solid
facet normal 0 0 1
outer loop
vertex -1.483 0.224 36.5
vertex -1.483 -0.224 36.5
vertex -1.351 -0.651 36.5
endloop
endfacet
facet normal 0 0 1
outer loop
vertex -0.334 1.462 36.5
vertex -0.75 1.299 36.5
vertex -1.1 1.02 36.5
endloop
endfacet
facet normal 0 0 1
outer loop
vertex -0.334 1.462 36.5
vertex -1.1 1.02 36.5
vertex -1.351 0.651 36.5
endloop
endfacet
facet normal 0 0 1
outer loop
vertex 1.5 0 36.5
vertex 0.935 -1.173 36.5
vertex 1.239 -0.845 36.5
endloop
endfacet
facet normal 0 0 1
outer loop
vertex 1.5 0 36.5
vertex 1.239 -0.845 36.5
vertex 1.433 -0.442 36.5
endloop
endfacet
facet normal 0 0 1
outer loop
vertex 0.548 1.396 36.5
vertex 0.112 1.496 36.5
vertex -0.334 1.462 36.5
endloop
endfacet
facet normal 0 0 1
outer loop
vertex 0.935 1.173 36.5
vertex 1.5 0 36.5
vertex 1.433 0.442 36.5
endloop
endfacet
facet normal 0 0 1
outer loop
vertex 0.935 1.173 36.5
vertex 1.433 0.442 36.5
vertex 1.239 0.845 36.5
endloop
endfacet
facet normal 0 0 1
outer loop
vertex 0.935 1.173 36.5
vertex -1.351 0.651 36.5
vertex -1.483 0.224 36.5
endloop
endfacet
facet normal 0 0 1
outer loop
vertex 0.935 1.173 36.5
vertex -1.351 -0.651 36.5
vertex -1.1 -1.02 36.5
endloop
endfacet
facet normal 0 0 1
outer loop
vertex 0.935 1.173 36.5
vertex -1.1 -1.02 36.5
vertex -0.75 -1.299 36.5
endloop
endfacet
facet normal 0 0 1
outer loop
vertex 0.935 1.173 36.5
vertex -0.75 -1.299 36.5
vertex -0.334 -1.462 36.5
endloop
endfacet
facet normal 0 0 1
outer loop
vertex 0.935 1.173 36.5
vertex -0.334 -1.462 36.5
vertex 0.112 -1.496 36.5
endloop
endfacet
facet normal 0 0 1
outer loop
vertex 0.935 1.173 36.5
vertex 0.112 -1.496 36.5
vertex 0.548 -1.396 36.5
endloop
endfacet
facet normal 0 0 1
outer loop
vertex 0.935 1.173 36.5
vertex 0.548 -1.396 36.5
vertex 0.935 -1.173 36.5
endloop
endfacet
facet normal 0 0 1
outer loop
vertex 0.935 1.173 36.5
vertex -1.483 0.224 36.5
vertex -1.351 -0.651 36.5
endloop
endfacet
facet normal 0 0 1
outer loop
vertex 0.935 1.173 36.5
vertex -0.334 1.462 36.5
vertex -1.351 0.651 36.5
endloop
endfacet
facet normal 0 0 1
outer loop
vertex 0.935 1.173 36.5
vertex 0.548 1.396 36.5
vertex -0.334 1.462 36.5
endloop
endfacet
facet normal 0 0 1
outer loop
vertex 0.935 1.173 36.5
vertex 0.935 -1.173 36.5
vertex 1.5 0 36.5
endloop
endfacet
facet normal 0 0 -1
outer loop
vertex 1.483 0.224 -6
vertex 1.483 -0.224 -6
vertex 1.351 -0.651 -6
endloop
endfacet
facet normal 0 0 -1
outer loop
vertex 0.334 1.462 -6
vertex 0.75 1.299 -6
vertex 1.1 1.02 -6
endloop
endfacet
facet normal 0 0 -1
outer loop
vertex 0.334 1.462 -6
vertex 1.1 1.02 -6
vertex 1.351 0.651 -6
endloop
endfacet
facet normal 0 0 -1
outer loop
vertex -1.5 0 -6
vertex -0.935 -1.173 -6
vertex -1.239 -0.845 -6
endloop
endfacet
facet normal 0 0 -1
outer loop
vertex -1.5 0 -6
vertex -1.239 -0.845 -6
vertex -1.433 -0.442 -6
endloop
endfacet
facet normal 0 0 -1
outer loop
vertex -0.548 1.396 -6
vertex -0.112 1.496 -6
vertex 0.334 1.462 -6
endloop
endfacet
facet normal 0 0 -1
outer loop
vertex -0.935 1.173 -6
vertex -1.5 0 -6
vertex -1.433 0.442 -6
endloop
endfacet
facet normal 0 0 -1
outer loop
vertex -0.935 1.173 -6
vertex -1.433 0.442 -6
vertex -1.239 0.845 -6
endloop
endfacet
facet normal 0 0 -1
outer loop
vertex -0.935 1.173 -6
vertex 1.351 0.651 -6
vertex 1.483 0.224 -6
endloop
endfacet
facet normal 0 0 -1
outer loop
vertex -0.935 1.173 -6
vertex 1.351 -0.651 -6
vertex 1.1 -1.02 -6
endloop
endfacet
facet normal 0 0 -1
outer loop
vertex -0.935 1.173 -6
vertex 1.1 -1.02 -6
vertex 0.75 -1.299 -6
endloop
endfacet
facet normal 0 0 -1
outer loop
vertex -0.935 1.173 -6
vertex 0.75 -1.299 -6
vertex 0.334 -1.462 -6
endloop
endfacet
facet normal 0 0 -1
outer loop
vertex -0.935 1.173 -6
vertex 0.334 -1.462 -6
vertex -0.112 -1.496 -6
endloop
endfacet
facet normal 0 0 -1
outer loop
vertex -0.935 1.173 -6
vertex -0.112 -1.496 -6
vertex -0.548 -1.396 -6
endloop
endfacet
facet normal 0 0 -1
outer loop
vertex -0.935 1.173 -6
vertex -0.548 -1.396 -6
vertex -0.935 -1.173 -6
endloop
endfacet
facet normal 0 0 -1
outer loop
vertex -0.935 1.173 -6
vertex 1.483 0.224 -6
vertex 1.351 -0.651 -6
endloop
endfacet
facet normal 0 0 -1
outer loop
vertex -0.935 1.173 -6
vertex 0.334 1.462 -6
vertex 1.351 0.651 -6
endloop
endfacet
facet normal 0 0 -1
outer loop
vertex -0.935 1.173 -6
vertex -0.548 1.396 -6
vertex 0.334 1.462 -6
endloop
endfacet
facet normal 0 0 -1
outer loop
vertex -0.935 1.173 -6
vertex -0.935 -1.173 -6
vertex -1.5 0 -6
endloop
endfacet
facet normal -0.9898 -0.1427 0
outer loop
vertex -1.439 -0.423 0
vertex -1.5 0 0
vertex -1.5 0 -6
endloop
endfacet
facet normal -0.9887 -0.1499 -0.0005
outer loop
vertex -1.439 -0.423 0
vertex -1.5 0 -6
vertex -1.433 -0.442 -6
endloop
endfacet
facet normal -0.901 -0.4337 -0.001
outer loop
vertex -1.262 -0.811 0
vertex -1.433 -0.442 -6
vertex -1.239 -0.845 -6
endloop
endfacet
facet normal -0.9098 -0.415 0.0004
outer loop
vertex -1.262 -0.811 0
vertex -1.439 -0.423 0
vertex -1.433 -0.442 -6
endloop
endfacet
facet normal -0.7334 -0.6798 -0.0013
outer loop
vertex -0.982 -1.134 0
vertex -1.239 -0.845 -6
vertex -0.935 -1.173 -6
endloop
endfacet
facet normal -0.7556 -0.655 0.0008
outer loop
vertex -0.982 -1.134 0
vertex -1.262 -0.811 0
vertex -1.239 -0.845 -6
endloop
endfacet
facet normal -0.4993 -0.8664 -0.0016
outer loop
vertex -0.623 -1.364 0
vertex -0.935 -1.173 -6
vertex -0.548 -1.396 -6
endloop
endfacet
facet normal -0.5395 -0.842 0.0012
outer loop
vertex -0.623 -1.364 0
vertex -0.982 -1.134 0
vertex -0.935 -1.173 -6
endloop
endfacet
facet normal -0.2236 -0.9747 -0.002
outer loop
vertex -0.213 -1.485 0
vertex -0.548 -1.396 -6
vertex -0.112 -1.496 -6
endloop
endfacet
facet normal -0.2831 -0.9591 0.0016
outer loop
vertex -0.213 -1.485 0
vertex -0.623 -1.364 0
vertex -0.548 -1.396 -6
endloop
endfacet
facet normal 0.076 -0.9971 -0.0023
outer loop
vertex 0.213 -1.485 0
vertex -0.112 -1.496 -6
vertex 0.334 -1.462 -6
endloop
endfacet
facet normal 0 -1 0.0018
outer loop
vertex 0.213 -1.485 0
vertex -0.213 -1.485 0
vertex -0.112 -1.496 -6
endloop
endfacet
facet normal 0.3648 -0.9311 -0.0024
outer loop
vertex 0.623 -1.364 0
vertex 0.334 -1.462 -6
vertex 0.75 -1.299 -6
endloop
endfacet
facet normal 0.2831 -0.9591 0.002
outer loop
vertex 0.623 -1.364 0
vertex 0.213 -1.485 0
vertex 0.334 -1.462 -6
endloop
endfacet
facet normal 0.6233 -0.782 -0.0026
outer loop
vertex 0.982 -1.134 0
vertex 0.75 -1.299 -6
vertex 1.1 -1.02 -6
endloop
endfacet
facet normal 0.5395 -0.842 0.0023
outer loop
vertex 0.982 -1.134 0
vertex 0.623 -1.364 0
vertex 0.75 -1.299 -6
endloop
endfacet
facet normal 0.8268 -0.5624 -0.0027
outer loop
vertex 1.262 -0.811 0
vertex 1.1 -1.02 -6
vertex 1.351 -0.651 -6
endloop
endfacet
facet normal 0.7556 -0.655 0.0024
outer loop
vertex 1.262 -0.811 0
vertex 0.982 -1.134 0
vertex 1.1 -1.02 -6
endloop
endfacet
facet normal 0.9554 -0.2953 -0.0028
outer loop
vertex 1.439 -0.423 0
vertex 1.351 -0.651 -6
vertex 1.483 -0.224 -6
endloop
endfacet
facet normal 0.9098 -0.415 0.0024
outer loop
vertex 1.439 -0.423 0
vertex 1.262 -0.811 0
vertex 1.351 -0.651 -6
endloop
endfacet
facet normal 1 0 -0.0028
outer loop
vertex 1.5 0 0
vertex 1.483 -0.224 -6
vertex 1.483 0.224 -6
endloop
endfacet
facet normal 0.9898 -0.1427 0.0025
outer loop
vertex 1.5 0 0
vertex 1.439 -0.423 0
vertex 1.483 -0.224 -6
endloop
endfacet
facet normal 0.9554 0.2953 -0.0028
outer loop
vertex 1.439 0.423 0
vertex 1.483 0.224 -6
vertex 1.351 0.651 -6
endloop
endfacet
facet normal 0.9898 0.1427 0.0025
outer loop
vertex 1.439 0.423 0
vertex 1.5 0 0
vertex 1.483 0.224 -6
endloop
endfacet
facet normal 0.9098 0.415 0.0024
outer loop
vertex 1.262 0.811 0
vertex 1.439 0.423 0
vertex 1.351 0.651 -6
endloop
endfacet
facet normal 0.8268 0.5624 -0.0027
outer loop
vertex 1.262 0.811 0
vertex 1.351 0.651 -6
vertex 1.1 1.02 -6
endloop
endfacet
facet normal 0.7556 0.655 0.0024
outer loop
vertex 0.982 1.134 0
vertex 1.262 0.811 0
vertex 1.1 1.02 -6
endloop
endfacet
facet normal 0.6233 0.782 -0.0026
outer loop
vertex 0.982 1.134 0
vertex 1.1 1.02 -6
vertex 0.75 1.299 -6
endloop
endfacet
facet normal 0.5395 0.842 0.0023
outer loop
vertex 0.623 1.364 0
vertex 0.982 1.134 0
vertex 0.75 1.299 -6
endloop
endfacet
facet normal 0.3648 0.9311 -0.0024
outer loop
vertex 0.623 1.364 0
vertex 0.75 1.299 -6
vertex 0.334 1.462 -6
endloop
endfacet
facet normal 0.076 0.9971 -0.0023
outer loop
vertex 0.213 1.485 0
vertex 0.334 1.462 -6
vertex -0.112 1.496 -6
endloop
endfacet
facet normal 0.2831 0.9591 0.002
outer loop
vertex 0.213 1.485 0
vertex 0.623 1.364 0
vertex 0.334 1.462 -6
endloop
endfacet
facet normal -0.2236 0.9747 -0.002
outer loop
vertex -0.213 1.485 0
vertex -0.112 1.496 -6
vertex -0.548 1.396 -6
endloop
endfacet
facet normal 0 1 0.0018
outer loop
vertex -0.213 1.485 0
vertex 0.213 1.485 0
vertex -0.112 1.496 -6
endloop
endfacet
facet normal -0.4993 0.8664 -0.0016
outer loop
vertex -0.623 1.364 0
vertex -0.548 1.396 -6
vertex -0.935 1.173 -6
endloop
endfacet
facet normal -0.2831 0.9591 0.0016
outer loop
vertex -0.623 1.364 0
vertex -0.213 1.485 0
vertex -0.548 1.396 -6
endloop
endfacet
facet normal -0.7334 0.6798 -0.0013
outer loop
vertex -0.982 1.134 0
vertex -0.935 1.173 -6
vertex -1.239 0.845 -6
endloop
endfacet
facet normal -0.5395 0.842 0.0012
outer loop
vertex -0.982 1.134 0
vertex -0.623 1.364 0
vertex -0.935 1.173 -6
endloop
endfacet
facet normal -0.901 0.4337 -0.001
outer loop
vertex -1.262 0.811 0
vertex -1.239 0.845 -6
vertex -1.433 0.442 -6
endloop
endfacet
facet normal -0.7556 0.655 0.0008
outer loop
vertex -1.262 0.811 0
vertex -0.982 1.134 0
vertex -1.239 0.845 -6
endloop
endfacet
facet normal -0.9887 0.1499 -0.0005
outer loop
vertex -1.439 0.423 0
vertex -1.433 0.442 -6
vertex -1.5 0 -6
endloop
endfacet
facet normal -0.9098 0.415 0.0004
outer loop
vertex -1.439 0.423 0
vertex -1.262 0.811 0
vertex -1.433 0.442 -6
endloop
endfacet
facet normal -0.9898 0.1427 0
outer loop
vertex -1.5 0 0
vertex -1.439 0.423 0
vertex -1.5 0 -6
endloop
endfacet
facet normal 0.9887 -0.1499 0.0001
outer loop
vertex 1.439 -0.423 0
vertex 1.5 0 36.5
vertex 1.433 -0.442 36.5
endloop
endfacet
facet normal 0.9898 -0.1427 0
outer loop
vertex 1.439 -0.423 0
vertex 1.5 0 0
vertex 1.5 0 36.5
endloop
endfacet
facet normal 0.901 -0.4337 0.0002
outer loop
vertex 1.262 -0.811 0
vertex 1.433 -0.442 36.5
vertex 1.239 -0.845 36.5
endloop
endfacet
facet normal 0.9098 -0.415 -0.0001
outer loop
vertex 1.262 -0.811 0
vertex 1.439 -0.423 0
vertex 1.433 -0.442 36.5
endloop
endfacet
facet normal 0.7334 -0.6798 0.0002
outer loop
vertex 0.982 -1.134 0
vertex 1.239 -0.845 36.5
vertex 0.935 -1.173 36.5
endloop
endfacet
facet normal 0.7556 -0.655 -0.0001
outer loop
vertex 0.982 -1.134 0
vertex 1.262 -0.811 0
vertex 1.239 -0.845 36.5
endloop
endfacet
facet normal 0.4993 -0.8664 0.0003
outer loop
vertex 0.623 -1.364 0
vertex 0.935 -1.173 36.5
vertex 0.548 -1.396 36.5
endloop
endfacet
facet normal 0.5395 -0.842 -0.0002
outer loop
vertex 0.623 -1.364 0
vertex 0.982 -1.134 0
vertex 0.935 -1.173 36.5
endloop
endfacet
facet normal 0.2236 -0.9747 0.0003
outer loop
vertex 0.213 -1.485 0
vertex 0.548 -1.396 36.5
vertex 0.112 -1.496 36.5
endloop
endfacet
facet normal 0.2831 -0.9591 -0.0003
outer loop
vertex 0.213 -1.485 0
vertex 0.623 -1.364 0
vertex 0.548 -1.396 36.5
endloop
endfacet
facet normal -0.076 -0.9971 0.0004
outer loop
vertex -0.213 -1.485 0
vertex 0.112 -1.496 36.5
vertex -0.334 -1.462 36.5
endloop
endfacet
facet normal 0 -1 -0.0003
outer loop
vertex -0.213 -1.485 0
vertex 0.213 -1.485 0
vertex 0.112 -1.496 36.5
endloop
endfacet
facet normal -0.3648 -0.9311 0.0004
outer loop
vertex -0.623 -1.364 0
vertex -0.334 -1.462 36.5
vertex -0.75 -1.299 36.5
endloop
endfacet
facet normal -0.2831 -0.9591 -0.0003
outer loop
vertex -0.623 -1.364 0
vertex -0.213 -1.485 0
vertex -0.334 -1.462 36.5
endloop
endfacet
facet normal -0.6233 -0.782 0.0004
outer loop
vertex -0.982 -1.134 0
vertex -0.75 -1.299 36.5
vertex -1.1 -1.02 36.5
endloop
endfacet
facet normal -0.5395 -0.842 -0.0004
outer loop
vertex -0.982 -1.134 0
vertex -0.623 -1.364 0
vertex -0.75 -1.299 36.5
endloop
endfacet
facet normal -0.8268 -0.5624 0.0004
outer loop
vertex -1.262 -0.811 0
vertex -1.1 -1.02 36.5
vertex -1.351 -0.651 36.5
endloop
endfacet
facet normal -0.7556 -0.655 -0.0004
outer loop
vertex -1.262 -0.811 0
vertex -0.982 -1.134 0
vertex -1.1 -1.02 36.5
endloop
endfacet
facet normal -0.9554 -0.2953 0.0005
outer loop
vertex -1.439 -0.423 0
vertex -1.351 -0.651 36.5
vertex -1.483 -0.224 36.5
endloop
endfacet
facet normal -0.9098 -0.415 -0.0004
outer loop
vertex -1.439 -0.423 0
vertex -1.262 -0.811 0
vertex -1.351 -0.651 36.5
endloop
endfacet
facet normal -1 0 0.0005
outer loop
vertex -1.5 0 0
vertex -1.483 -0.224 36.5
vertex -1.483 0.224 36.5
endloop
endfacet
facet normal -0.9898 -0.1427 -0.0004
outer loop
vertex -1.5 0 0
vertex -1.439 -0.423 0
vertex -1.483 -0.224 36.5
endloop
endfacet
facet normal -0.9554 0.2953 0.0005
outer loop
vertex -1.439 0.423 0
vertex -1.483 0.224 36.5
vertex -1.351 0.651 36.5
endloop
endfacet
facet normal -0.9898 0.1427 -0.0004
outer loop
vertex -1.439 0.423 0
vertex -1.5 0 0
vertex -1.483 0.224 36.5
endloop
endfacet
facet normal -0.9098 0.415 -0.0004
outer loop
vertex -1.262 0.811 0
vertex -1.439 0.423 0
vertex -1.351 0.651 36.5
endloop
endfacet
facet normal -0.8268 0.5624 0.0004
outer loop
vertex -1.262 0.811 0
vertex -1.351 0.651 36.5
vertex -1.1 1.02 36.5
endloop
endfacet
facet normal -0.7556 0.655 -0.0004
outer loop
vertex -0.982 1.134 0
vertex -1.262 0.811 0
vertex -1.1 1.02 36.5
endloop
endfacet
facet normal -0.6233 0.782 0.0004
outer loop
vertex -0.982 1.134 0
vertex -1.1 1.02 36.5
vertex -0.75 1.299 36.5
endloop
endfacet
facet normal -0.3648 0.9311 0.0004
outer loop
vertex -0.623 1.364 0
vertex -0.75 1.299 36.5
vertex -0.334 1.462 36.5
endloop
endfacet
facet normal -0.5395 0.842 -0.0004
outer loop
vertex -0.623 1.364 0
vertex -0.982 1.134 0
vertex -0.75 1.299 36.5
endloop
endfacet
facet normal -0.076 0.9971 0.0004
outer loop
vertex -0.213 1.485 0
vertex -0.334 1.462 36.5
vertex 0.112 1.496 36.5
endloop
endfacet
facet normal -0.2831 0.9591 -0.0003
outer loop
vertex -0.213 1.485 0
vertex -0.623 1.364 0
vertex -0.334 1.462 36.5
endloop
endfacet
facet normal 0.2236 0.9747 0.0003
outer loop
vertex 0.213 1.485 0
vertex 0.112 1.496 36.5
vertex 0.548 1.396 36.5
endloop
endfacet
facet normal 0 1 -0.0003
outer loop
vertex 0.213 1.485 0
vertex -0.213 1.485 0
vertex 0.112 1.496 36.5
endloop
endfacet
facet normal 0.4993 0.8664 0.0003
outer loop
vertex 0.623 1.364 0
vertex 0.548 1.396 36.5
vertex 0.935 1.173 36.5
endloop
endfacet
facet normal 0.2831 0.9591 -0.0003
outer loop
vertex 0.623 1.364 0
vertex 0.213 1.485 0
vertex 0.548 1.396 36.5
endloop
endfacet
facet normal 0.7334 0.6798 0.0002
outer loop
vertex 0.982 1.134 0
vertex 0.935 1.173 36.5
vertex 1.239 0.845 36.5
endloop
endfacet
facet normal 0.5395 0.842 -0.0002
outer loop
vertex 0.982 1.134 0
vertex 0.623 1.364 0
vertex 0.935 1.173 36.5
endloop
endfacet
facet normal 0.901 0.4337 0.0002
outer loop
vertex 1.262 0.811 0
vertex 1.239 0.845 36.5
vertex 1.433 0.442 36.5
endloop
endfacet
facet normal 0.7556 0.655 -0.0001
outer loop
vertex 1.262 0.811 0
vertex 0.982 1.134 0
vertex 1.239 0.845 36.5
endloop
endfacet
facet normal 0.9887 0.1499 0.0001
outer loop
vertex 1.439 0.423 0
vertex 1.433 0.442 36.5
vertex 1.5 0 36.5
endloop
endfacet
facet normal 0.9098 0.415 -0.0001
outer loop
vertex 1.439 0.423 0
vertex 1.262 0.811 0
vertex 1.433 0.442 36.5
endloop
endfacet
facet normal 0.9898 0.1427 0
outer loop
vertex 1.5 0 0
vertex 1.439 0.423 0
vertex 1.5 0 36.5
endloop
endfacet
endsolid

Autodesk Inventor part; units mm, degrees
ref_plane "YZ Plane" through (0, 0, 0) normal (1, 0, 0) x (0, 1, 0)
ref_plane "XZ Plane" through (0, 0, 0) normal (0, 1, 0) x (-1, 0, 0)
ref_plane "XY Plane" through (0, 0, 0) normal (0, 0, 1) x (1, 0, 0)
sketch "Sketch1" plane through (0, 0, 0) normal (0, 0, 1) x (1, 0, 0)
  circle A0 centre (0, 0) radius 1.5
  dimension "d0" = 3
extrude "Extrusion1" add sketch "Sketch1" along normal blind 30
sketch "Sketch4" plane through (0, 0, 30) normal (0, 0, 1) x (1, 0, 0)
  circle A0 centre (0, 0) radius 1.5
extrude "Extrusion3" add sketch "Sketch4" along normal blind 6.5
sketch "Sketch5" plane through (0, 0, 0) normal (0, 0, -1) x (-1, 0, 0)
  circle A0 centre (0, 0) radius 1.5 projected
  circle A1 centre (0, 0) radius 1.5
extrude "Extrusion4" add sketch "Sketch5" along normal blind 6
properties part number "Extra Shaft"
